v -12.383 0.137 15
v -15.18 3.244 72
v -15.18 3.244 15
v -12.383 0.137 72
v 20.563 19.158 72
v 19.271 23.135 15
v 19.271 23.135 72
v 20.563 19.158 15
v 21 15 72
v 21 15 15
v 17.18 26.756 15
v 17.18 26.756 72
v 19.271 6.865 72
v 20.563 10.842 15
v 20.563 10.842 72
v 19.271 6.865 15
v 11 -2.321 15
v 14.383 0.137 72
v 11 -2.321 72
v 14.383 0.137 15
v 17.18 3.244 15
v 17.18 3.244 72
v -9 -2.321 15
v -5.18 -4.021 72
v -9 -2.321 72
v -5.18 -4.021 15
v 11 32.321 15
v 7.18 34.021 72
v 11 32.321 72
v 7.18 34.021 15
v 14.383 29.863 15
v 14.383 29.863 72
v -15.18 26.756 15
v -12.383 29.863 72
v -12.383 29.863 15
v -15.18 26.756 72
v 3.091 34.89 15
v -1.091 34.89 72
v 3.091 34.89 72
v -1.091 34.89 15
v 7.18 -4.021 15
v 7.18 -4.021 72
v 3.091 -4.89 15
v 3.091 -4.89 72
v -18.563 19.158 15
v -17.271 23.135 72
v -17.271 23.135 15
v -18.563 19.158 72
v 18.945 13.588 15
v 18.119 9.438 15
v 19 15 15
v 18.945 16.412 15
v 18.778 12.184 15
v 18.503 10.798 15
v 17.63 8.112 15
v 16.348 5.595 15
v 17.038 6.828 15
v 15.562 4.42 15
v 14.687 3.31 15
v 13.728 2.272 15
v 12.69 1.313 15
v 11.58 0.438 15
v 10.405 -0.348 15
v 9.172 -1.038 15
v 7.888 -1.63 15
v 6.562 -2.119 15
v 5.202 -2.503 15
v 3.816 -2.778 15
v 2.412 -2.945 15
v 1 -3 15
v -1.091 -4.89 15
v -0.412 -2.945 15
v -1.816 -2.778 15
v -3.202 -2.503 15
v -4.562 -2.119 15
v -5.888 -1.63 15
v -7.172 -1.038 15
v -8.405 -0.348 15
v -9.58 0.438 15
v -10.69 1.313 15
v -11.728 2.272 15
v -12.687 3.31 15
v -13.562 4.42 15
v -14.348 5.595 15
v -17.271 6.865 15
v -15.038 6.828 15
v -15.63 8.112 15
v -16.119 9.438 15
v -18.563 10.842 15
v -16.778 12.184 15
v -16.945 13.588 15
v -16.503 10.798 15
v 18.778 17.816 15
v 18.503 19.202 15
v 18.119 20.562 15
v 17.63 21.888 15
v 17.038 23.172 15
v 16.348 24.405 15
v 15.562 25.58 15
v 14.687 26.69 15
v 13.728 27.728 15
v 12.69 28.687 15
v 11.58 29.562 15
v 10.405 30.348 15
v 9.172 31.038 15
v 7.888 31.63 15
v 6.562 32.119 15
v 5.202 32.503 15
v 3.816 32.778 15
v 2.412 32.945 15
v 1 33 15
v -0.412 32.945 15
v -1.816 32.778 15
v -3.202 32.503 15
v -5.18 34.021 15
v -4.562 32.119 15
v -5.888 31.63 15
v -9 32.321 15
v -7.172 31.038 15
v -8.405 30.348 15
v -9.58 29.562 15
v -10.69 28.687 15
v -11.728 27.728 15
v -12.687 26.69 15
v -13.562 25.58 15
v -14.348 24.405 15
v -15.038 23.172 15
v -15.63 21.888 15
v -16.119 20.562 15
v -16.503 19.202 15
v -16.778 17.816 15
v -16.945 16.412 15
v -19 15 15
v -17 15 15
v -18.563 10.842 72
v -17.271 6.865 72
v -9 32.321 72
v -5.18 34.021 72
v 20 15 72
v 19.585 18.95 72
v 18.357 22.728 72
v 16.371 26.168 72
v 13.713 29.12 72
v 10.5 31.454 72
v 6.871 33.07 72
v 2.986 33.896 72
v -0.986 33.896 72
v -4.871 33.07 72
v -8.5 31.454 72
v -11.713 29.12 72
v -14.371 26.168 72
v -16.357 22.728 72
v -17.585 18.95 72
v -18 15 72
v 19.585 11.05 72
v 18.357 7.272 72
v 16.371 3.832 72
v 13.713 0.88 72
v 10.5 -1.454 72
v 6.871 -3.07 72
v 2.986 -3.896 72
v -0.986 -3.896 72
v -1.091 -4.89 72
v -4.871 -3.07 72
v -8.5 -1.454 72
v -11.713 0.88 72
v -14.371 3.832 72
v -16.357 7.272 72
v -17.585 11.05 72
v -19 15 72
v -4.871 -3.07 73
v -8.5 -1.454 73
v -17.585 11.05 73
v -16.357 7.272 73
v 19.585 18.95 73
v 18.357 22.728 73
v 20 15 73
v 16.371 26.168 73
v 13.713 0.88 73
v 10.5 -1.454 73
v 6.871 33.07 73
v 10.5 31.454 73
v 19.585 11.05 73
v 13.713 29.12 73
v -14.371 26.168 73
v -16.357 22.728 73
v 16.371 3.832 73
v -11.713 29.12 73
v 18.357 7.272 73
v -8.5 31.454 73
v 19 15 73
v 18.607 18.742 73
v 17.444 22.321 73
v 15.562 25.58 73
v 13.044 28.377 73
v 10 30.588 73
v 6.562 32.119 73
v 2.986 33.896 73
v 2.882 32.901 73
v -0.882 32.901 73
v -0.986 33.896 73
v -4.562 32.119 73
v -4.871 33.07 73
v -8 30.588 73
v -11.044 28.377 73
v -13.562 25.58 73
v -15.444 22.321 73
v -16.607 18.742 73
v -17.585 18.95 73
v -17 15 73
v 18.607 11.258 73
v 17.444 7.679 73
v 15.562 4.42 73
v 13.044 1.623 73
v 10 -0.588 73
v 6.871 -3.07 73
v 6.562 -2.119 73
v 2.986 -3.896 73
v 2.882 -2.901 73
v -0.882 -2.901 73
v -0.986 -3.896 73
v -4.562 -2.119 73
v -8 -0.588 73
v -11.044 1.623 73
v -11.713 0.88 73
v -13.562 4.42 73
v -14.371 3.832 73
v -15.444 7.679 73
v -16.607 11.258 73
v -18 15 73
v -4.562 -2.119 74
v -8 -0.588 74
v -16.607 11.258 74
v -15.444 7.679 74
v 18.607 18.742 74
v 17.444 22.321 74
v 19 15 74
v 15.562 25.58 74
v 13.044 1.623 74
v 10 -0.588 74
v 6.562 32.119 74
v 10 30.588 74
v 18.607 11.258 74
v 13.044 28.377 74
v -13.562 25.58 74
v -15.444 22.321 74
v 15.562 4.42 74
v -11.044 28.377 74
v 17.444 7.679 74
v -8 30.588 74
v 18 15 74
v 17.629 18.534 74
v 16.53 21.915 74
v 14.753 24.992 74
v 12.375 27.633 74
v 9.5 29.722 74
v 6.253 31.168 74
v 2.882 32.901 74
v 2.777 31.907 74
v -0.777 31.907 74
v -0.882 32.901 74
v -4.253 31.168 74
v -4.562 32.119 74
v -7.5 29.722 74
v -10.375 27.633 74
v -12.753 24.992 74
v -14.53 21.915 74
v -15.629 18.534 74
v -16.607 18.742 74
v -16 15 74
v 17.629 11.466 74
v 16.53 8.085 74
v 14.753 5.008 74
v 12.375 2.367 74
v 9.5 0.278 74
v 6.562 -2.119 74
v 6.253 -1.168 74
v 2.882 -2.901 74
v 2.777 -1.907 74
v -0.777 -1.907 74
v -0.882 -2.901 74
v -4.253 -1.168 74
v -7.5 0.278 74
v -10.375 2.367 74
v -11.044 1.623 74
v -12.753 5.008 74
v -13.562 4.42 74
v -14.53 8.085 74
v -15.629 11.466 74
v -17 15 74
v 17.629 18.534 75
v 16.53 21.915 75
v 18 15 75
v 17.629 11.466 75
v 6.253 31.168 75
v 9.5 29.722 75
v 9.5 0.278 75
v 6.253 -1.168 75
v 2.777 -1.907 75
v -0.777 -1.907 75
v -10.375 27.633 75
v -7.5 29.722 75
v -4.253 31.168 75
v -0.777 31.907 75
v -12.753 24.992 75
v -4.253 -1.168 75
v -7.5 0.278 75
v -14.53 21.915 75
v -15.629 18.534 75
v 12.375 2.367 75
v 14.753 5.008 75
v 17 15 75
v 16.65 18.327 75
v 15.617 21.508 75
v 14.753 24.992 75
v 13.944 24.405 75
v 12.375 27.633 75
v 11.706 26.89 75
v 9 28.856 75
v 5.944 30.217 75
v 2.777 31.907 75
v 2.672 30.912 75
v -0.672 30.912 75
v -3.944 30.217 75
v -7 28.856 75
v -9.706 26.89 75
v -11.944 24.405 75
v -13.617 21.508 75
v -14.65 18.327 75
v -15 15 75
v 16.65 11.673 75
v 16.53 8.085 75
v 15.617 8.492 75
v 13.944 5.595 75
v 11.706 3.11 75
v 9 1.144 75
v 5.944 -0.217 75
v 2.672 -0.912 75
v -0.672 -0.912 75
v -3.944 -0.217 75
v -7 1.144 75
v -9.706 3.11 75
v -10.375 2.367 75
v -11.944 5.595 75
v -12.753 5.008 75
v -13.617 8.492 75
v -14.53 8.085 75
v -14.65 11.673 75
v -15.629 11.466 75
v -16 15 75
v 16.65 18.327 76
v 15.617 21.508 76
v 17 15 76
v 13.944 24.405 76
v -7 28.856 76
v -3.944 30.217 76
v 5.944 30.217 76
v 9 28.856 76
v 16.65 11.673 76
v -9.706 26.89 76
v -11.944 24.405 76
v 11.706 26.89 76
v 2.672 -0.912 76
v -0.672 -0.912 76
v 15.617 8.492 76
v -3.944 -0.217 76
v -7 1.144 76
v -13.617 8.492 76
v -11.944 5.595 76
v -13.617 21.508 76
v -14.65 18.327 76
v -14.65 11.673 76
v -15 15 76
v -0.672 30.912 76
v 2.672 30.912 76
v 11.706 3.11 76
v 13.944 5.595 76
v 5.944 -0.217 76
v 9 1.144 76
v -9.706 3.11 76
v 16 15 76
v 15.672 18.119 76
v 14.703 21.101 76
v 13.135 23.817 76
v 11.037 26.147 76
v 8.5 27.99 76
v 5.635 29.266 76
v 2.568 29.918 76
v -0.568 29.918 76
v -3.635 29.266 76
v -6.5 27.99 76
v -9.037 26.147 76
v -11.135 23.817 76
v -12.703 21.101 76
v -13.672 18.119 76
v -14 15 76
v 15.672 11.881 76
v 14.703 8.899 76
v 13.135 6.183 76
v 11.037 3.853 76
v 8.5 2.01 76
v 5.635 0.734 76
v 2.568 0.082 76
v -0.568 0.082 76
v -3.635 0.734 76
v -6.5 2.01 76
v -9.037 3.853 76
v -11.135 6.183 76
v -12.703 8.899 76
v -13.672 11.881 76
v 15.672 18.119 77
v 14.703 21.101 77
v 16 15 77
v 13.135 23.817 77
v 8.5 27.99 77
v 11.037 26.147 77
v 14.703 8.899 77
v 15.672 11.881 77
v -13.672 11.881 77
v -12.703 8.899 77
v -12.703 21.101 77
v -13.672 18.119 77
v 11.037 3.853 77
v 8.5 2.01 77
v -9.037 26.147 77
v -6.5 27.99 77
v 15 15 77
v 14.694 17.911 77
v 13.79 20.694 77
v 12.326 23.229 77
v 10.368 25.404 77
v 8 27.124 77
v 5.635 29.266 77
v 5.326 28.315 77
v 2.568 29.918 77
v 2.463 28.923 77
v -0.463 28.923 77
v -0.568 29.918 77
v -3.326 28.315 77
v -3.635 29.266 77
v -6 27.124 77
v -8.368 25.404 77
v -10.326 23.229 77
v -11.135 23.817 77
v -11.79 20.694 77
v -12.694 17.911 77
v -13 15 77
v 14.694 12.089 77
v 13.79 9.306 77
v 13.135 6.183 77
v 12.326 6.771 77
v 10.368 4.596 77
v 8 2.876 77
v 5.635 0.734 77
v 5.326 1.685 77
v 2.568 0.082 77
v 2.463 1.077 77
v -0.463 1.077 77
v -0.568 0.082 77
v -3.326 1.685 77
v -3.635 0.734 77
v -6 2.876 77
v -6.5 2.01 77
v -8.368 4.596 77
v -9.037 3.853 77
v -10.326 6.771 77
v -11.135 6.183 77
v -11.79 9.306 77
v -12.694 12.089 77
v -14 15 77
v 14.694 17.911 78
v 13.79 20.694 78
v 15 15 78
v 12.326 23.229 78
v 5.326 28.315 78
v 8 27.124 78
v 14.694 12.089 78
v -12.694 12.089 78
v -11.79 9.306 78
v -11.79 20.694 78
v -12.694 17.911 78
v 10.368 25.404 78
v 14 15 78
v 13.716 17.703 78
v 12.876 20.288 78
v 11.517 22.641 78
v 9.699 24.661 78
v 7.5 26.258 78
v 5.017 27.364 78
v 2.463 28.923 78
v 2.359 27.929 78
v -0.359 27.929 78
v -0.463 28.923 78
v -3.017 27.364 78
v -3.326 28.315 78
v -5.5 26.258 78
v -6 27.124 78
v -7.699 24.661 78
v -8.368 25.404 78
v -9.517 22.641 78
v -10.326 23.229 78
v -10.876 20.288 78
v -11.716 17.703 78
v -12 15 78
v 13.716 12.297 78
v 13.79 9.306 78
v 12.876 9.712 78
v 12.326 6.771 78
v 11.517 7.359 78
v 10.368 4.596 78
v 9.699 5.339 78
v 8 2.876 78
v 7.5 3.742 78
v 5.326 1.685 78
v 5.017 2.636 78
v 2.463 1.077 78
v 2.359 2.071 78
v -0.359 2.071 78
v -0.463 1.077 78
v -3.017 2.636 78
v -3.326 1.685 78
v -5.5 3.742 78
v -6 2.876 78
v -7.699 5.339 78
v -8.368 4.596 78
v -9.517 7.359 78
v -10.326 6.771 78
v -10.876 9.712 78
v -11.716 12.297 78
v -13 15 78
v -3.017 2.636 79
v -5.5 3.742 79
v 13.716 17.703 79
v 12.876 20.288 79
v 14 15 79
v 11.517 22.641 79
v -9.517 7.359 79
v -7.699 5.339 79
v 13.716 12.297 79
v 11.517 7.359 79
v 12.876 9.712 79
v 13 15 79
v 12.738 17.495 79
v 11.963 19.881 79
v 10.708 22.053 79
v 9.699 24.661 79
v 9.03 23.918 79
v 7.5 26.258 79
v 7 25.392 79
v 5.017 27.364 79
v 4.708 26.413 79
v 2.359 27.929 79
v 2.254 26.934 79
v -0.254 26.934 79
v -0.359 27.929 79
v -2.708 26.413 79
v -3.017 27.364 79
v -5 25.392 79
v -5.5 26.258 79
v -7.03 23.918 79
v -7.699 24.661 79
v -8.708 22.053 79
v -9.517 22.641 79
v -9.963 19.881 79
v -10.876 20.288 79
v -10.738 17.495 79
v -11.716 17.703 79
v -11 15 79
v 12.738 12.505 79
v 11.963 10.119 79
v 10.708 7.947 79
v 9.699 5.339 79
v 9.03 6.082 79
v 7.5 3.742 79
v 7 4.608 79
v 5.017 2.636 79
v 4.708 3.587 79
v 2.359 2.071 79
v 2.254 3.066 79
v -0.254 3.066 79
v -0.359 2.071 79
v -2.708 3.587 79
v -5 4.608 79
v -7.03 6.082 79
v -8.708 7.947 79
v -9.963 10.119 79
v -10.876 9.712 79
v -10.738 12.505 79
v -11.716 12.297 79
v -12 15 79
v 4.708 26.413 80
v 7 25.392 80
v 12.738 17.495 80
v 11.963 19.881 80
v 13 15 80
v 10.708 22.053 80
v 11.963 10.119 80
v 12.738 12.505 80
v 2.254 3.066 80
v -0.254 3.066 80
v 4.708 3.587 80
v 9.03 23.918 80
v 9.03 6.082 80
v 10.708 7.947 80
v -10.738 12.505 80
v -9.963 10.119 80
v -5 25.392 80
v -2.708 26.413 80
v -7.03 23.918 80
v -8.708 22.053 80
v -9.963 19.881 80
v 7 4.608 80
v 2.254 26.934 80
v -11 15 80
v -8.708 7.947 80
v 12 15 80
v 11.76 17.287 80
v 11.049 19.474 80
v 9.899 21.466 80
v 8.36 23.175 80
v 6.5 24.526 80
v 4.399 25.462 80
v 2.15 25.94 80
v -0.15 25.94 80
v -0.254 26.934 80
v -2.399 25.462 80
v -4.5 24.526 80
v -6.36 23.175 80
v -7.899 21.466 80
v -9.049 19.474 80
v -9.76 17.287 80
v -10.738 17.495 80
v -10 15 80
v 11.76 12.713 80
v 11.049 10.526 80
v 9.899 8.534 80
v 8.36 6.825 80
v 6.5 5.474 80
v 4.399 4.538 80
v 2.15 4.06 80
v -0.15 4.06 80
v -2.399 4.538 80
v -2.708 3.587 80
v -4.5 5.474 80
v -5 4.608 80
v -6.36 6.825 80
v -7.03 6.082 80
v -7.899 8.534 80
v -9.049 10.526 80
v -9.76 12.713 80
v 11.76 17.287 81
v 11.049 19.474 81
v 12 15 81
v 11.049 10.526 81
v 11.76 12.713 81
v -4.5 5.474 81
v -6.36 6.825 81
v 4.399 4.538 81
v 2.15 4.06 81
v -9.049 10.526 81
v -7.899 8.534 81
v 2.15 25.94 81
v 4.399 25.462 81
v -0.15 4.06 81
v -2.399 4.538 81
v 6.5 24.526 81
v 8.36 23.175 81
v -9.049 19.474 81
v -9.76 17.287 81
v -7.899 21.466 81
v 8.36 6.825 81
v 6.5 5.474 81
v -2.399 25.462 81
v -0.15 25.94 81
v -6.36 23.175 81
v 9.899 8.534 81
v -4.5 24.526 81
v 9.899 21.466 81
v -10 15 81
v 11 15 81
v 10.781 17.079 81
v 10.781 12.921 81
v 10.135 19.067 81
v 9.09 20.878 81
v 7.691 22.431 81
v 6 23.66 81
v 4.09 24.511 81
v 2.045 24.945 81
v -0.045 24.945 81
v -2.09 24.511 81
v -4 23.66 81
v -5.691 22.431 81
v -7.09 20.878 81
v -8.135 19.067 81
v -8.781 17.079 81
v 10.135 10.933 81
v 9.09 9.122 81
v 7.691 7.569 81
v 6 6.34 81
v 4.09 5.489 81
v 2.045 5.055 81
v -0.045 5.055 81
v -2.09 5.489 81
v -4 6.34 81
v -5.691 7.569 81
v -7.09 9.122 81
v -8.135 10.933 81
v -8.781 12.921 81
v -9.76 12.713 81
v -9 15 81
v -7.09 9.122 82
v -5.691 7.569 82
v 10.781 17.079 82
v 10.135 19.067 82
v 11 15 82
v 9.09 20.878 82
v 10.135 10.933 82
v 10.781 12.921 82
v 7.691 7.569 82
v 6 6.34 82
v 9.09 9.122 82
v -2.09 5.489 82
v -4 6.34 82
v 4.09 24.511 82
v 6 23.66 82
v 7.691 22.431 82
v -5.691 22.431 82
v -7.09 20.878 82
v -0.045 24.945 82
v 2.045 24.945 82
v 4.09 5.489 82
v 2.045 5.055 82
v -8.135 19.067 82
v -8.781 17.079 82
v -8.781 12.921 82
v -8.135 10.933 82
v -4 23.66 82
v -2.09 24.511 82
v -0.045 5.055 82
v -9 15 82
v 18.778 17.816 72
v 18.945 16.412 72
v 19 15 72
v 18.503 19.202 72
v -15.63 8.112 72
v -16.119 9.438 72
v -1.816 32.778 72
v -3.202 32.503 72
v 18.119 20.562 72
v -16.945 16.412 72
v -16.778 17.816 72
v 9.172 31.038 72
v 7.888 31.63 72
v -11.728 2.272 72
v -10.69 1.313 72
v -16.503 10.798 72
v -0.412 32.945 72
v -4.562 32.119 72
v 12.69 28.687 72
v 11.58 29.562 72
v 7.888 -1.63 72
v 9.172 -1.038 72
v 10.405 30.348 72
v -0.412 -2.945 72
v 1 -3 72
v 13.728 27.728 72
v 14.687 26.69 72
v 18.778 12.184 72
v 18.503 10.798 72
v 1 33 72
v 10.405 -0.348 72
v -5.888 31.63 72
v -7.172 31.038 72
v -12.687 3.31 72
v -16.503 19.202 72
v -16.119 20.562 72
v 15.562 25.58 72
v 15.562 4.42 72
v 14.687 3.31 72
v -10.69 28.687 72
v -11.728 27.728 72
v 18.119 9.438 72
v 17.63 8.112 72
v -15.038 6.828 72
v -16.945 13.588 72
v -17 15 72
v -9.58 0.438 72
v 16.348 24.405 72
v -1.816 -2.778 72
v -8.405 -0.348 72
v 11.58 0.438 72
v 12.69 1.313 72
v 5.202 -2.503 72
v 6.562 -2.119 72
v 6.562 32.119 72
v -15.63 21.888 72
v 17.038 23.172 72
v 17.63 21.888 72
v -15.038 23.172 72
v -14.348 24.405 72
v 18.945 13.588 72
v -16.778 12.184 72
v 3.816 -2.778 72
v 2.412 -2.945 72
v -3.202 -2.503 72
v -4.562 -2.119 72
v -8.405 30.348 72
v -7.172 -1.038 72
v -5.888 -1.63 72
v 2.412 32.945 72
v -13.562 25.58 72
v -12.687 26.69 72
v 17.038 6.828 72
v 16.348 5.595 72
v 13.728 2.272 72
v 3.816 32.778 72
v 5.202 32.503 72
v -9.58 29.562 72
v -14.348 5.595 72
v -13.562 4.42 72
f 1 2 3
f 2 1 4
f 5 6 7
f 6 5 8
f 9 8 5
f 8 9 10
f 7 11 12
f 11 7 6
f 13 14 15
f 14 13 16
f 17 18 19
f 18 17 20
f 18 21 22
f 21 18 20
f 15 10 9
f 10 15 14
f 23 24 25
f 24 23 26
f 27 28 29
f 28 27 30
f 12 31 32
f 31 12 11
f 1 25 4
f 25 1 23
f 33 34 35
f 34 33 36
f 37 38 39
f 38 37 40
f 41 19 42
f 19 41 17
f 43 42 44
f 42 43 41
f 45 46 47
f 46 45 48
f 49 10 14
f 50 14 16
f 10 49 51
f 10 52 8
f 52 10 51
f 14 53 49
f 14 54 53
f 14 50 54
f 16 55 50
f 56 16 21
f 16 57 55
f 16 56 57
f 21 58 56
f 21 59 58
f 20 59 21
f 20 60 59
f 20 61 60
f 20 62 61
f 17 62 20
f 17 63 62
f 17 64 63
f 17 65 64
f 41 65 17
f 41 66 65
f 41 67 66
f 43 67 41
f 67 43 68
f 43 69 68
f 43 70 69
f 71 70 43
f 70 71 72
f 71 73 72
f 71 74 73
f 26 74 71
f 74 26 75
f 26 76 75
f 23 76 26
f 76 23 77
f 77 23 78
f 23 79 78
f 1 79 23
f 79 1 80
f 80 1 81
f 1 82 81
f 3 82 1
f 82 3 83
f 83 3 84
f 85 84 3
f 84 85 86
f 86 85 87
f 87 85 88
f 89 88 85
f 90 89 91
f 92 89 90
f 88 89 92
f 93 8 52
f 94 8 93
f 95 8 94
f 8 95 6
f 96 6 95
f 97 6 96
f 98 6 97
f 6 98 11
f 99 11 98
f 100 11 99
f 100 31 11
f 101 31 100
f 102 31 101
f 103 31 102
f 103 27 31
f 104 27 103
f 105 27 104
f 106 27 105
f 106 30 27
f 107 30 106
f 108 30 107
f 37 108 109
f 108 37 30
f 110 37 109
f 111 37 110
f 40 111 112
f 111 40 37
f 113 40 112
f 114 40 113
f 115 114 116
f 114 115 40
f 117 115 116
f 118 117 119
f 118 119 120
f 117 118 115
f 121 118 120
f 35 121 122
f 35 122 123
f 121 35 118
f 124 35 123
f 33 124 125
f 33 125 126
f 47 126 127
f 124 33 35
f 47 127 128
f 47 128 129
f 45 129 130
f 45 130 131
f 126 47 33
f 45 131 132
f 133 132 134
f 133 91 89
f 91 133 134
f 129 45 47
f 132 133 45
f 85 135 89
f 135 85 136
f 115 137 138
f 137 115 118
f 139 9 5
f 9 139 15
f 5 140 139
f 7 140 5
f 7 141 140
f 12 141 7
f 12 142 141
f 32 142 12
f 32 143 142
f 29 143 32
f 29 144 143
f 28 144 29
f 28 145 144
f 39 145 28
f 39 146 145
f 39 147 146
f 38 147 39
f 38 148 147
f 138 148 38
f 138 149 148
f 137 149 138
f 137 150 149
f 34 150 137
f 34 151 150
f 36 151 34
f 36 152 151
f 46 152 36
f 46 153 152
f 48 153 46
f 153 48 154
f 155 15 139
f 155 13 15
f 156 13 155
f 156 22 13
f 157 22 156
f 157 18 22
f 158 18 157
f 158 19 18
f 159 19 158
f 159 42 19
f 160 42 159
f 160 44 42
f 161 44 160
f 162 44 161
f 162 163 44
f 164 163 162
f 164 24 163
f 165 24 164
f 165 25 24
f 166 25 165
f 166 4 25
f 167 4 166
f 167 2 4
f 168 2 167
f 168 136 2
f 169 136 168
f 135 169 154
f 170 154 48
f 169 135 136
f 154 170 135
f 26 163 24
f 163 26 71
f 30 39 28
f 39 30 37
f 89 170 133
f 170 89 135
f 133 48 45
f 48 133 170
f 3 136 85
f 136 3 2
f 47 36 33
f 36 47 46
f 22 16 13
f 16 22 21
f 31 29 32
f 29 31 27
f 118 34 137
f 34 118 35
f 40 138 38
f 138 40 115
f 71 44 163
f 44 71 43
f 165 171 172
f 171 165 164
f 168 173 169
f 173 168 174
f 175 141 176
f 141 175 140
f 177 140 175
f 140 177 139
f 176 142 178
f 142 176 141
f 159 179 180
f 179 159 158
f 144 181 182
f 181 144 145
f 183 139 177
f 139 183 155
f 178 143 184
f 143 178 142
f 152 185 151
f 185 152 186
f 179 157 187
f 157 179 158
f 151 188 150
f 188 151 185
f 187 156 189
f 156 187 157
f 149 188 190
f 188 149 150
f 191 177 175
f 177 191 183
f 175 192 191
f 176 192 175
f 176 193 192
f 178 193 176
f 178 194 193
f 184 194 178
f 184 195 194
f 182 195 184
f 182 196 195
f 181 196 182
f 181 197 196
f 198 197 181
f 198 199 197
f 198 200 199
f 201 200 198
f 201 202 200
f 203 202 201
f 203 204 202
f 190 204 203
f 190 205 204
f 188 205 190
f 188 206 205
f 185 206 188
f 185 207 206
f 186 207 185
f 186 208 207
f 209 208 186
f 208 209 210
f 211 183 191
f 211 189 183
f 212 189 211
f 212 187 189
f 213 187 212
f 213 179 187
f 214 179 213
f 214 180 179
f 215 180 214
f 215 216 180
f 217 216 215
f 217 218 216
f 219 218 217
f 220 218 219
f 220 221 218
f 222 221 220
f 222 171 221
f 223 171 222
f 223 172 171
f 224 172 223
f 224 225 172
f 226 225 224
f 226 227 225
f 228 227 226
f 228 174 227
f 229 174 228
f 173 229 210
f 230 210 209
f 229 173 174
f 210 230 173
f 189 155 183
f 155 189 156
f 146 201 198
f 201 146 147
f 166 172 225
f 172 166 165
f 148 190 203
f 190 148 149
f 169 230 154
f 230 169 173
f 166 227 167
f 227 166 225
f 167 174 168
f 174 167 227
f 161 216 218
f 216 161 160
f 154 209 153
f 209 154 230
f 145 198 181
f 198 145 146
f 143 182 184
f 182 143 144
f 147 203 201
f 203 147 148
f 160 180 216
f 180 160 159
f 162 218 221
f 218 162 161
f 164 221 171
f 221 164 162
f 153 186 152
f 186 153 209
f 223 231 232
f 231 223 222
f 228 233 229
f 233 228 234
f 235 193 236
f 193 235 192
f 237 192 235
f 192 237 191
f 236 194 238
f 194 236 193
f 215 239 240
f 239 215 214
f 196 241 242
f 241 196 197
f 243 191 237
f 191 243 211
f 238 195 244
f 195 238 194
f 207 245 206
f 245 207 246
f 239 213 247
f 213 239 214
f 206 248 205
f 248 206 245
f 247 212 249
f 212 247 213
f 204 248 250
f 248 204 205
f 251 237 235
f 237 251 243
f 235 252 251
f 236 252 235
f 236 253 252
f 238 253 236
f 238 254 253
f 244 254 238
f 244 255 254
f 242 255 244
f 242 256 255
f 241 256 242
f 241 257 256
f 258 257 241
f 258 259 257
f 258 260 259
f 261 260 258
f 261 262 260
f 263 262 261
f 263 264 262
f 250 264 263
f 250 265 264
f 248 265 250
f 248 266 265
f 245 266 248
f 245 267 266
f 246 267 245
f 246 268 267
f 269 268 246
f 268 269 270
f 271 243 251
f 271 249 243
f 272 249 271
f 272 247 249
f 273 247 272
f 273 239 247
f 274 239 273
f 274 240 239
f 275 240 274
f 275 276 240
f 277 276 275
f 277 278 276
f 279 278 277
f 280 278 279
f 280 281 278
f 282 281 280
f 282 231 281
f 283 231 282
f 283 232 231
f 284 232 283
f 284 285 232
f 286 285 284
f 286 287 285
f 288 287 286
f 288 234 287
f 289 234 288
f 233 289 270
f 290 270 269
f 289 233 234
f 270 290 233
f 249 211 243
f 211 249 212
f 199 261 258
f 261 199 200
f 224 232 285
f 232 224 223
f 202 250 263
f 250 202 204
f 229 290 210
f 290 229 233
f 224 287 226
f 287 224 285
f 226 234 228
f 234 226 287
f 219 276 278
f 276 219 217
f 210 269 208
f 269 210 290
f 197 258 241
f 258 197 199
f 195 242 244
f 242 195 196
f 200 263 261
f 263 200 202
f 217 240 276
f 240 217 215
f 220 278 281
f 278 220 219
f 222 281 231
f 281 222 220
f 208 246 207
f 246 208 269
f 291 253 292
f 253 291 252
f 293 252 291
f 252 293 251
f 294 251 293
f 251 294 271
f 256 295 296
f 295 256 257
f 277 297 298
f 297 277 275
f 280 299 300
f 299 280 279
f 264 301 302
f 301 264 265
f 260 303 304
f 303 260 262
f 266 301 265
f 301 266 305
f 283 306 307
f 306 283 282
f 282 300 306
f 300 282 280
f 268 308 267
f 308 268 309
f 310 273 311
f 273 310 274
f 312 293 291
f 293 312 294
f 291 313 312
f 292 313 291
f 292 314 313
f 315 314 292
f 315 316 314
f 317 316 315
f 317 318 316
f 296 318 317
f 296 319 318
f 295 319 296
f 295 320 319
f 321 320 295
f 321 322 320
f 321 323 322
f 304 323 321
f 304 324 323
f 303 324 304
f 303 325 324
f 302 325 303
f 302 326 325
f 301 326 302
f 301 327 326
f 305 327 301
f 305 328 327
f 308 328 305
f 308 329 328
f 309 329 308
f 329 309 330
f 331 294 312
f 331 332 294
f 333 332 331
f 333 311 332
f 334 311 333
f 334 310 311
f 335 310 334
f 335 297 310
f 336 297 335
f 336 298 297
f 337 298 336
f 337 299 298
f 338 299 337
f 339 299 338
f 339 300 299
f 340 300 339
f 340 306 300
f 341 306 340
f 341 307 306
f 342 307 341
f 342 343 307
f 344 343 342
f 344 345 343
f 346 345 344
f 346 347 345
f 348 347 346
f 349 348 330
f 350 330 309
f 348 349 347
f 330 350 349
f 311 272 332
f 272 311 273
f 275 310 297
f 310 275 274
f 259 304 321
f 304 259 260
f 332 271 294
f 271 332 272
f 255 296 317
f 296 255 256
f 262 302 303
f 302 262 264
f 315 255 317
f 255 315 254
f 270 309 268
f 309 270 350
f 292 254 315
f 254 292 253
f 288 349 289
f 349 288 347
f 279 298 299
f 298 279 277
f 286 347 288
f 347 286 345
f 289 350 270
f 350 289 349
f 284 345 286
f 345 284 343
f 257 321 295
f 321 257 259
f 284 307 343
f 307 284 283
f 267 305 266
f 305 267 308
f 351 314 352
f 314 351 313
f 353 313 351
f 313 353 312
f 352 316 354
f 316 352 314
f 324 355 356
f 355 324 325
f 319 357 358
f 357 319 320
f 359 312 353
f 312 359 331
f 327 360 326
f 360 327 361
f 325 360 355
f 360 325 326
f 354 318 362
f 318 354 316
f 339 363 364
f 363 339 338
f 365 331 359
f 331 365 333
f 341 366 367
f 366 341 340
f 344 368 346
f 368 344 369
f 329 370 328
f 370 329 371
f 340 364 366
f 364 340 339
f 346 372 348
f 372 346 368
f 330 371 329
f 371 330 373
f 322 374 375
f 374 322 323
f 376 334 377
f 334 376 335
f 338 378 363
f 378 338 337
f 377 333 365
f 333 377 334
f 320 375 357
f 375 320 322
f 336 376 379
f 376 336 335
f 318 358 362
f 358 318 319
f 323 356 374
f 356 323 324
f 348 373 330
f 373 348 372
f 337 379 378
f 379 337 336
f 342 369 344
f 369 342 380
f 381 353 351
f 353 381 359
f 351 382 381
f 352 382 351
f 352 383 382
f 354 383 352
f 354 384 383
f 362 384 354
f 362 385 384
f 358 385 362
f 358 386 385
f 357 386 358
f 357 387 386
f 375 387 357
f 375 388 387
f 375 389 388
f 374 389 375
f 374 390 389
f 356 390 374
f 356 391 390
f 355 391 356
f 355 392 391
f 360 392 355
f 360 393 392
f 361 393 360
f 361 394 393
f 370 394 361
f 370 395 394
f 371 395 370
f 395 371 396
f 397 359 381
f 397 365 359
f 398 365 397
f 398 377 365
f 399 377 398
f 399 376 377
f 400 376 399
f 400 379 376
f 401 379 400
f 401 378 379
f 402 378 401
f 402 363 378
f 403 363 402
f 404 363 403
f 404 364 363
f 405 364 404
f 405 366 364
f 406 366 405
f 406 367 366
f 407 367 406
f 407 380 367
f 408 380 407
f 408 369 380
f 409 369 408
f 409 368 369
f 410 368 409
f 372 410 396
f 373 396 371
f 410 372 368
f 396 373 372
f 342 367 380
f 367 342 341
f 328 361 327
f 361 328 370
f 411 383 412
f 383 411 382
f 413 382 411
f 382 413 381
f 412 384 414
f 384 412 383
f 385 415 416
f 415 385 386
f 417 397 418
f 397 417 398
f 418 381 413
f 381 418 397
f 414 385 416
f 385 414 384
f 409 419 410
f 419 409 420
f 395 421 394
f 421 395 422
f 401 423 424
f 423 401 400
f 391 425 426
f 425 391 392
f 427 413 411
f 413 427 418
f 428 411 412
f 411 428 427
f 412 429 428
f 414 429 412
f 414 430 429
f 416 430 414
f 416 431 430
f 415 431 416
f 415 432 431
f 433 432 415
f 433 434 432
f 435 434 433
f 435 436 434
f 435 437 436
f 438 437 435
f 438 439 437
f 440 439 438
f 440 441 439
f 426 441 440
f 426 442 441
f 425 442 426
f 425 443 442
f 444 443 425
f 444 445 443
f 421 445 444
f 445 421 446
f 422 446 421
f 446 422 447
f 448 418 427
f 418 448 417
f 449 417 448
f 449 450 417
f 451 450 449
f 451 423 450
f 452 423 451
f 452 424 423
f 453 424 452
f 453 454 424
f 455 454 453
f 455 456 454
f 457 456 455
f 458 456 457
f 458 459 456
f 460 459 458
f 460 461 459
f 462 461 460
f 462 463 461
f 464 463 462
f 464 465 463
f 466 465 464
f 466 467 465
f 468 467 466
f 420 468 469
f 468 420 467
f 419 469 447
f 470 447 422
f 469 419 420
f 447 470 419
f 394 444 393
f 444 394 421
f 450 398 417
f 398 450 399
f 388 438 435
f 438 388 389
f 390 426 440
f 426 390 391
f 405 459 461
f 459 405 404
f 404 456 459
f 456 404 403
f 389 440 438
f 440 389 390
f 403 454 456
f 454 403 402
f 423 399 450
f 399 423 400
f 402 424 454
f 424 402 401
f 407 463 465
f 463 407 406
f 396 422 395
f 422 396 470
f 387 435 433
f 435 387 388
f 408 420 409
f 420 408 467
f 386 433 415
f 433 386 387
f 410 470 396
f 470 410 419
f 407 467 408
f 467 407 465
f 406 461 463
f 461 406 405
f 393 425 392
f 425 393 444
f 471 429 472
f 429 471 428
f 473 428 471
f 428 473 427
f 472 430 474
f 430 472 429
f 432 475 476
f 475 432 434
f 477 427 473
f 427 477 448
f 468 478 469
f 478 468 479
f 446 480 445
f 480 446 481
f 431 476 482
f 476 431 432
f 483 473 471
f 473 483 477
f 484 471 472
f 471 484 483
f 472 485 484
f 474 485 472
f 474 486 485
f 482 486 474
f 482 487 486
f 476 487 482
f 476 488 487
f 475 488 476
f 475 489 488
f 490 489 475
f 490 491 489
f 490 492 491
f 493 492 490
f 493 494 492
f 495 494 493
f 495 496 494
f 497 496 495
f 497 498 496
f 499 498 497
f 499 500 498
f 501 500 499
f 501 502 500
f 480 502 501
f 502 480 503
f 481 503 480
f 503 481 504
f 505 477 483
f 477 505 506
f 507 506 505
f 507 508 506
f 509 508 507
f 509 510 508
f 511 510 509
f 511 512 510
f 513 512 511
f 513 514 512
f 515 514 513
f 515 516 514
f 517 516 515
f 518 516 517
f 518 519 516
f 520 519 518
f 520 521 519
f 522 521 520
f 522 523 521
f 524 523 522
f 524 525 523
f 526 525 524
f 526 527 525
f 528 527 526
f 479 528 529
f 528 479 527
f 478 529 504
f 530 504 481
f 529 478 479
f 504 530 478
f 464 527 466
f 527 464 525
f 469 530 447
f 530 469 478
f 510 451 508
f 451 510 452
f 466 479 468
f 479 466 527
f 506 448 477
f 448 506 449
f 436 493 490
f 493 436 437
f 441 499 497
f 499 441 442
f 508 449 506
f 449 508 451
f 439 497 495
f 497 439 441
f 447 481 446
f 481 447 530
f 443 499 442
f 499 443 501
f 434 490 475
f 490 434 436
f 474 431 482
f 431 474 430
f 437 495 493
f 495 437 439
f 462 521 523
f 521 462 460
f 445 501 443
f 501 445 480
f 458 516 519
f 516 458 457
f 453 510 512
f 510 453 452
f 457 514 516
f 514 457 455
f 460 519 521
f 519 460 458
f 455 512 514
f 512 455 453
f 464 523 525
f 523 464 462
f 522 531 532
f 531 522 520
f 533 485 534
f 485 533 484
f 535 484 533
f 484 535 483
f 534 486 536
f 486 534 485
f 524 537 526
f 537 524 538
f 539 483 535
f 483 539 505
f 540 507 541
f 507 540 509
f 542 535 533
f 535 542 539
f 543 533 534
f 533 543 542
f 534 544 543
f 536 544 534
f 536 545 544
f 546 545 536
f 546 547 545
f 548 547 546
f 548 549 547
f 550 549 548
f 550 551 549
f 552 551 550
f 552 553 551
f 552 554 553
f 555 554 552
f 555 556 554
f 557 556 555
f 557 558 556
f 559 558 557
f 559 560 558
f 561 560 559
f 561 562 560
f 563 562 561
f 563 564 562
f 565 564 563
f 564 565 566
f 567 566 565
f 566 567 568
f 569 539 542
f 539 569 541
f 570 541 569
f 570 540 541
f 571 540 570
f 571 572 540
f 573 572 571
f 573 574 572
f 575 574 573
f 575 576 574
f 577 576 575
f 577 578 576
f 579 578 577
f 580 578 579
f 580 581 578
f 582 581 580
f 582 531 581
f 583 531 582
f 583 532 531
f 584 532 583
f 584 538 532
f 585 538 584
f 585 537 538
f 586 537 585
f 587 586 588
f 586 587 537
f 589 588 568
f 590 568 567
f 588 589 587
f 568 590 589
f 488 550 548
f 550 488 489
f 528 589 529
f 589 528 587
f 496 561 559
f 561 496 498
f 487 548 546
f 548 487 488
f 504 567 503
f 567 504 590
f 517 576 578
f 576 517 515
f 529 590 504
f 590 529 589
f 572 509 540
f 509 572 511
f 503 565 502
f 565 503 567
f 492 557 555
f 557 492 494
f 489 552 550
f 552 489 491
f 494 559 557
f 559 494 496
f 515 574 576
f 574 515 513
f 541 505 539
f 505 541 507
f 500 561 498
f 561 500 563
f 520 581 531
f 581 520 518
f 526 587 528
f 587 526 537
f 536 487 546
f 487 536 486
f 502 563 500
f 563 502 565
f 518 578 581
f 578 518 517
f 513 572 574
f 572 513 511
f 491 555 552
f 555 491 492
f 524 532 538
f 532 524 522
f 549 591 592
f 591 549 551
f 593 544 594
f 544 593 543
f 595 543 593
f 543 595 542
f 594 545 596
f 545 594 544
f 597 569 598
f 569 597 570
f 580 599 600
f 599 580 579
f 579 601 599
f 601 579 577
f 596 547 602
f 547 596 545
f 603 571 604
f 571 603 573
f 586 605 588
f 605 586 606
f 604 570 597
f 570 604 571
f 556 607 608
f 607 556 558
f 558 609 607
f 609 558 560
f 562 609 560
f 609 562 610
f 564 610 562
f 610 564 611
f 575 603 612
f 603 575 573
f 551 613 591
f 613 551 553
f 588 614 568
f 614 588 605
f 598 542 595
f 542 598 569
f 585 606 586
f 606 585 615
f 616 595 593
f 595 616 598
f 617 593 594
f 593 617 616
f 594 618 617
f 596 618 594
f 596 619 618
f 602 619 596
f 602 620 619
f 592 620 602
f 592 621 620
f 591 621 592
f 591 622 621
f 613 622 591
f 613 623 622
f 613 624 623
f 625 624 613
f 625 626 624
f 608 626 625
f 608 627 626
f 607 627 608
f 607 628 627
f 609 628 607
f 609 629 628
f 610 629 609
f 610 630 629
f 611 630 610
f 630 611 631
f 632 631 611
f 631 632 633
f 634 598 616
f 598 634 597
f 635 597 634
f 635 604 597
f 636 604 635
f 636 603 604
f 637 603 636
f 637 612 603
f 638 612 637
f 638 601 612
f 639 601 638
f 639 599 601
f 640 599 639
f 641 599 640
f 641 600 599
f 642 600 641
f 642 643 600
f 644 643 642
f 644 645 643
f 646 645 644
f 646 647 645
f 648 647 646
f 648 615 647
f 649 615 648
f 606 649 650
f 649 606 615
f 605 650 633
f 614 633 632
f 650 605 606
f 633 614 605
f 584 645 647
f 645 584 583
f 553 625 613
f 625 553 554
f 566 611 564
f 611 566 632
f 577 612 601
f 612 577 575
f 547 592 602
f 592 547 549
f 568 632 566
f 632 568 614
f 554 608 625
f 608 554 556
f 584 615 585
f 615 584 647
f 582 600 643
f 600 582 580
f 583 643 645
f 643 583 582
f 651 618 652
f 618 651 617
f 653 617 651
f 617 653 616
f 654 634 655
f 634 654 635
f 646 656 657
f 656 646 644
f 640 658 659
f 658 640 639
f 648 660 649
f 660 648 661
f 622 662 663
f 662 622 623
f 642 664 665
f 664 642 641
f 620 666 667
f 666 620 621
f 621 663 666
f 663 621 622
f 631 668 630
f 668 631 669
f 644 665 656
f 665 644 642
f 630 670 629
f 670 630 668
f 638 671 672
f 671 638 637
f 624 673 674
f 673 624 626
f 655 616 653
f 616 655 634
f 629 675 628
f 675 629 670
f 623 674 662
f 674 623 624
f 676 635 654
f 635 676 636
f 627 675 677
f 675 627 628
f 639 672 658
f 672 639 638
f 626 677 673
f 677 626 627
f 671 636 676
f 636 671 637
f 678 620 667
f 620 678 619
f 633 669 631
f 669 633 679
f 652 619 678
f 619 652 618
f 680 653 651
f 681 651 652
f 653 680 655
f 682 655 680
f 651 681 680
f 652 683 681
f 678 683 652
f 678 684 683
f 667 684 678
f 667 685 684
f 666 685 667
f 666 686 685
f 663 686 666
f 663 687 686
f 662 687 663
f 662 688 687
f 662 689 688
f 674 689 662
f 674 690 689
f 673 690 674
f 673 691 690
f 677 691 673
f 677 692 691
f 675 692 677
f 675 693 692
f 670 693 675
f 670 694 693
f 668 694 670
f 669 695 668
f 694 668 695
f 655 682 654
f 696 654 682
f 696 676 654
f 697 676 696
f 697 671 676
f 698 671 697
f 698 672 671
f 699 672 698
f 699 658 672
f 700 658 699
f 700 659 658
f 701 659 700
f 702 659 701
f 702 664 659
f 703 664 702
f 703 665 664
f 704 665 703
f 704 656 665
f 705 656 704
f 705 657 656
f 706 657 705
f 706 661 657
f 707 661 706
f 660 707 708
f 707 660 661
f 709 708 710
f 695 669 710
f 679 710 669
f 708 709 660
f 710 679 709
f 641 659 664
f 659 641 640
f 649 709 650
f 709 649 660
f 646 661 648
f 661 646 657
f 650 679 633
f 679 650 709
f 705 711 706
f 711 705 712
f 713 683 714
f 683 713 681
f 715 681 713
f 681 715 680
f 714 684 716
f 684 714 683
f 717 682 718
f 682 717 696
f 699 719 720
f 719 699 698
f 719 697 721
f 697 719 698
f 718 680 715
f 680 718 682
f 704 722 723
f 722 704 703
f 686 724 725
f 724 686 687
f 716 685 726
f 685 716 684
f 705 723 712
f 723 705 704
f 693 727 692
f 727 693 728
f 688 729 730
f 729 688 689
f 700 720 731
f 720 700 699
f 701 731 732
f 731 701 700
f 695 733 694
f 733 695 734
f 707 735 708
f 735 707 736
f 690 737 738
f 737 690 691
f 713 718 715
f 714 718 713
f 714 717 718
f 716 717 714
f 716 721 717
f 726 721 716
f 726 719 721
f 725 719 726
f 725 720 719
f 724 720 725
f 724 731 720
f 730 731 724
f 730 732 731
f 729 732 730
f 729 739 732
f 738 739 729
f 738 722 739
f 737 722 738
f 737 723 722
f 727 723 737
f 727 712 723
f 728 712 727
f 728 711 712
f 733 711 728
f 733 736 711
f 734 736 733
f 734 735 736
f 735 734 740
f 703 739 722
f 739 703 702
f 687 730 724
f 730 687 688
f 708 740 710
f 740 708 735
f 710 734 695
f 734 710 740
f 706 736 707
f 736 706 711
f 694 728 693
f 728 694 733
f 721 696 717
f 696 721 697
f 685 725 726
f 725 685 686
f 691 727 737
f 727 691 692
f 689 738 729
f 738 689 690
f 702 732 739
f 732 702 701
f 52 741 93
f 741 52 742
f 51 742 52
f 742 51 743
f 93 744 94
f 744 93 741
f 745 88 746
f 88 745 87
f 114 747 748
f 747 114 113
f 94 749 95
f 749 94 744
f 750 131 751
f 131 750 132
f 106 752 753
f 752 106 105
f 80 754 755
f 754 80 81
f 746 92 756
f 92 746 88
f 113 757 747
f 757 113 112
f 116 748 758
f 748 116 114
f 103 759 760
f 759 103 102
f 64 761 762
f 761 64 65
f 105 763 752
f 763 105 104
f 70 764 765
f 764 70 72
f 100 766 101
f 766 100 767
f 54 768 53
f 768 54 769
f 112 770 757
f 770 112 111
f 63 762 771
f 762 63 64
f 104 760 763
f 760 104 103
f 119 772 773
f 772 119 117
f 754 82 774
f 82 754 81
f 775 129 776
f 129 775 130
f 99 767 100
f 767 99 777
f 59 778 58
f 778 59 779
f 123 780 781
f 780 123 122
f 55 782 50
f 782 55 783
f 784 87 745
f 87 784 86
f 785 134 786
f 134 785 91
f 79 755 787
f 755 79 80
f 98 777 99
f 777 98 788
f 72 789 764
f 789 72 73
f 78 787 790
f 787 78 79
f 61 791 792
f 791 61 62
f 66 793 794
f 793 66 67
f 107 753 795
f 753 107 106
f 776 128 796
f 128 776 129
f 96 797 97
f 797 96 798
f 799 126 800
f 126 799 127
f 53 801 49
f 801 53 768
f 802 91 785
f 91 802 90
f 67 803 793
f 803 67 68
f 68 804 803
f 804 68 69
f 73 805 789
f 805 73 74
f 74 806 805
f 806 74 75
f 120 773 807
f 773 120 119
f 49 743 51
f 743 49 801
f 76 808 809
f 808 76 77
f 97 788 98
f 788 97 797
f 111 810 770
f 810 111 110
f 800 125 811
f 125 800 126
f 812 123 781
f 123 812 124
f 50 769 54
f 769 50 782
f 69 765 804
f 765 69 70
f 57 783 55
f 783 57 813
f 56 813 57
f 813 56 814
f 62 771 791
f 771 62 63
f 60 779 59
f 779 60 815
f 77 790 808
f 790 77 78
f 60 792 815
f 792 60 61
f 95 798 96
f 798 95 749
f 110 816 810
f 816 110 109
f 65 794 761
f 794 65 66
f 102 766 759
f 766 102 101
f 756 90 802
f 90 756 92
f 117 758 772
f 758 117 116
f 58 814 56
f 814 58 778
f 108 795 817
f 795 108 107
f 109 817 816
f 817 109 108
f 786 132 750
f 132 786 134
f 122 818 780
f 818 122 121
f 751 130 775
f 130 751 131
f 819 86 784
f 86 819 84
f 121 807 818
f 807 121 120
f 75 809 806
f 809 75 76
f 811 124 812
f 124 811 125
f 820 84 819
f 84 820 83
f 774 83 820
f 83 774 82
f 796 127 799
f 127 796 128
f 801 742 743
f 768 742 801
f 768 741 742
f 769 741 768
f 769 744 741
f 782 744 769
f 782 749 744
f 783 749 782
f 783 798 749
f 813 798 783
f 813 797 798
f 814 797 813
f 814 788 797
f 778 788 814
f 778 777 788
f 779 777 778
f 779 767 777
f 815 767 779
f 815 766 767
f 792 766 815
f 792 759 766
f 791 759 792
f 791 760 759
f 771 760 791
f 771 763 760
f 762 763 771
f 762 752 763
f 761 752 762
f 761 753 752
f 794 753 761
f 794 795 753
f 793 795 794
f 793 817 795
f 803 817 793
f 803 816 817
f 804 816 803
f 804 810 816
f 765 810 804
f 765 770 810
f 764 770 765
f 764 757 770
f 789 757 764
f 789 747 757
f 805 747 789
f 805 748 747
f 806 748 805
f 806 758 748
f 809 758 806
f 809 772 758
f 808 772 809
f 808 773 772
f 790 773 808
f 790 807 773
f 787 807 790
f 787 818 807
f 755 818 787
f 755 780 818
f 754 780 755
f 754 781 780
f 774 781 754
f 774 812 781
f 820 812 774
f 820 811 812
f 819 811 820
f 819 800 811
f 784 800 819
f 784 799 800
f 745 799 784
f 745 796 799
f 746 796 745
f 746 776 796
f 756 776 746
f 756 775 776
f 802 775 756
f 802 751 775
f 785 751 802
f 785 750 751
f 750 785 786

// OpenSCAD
hight = 60;
width = 23;
size = 15;
cup (60,18,12);

module cup (hight, width, size) {
difference(){
		translate([1,15,15]) 
		for(d = [0:10]){
			translate([0,0,d ])
			cylinder(h=hight-3, r=(20-d ), fn = 30); 
		}
		translate([1,15,15])
		cylinder(h=hight-3, r=width, $fn = 80);	
	}
}
